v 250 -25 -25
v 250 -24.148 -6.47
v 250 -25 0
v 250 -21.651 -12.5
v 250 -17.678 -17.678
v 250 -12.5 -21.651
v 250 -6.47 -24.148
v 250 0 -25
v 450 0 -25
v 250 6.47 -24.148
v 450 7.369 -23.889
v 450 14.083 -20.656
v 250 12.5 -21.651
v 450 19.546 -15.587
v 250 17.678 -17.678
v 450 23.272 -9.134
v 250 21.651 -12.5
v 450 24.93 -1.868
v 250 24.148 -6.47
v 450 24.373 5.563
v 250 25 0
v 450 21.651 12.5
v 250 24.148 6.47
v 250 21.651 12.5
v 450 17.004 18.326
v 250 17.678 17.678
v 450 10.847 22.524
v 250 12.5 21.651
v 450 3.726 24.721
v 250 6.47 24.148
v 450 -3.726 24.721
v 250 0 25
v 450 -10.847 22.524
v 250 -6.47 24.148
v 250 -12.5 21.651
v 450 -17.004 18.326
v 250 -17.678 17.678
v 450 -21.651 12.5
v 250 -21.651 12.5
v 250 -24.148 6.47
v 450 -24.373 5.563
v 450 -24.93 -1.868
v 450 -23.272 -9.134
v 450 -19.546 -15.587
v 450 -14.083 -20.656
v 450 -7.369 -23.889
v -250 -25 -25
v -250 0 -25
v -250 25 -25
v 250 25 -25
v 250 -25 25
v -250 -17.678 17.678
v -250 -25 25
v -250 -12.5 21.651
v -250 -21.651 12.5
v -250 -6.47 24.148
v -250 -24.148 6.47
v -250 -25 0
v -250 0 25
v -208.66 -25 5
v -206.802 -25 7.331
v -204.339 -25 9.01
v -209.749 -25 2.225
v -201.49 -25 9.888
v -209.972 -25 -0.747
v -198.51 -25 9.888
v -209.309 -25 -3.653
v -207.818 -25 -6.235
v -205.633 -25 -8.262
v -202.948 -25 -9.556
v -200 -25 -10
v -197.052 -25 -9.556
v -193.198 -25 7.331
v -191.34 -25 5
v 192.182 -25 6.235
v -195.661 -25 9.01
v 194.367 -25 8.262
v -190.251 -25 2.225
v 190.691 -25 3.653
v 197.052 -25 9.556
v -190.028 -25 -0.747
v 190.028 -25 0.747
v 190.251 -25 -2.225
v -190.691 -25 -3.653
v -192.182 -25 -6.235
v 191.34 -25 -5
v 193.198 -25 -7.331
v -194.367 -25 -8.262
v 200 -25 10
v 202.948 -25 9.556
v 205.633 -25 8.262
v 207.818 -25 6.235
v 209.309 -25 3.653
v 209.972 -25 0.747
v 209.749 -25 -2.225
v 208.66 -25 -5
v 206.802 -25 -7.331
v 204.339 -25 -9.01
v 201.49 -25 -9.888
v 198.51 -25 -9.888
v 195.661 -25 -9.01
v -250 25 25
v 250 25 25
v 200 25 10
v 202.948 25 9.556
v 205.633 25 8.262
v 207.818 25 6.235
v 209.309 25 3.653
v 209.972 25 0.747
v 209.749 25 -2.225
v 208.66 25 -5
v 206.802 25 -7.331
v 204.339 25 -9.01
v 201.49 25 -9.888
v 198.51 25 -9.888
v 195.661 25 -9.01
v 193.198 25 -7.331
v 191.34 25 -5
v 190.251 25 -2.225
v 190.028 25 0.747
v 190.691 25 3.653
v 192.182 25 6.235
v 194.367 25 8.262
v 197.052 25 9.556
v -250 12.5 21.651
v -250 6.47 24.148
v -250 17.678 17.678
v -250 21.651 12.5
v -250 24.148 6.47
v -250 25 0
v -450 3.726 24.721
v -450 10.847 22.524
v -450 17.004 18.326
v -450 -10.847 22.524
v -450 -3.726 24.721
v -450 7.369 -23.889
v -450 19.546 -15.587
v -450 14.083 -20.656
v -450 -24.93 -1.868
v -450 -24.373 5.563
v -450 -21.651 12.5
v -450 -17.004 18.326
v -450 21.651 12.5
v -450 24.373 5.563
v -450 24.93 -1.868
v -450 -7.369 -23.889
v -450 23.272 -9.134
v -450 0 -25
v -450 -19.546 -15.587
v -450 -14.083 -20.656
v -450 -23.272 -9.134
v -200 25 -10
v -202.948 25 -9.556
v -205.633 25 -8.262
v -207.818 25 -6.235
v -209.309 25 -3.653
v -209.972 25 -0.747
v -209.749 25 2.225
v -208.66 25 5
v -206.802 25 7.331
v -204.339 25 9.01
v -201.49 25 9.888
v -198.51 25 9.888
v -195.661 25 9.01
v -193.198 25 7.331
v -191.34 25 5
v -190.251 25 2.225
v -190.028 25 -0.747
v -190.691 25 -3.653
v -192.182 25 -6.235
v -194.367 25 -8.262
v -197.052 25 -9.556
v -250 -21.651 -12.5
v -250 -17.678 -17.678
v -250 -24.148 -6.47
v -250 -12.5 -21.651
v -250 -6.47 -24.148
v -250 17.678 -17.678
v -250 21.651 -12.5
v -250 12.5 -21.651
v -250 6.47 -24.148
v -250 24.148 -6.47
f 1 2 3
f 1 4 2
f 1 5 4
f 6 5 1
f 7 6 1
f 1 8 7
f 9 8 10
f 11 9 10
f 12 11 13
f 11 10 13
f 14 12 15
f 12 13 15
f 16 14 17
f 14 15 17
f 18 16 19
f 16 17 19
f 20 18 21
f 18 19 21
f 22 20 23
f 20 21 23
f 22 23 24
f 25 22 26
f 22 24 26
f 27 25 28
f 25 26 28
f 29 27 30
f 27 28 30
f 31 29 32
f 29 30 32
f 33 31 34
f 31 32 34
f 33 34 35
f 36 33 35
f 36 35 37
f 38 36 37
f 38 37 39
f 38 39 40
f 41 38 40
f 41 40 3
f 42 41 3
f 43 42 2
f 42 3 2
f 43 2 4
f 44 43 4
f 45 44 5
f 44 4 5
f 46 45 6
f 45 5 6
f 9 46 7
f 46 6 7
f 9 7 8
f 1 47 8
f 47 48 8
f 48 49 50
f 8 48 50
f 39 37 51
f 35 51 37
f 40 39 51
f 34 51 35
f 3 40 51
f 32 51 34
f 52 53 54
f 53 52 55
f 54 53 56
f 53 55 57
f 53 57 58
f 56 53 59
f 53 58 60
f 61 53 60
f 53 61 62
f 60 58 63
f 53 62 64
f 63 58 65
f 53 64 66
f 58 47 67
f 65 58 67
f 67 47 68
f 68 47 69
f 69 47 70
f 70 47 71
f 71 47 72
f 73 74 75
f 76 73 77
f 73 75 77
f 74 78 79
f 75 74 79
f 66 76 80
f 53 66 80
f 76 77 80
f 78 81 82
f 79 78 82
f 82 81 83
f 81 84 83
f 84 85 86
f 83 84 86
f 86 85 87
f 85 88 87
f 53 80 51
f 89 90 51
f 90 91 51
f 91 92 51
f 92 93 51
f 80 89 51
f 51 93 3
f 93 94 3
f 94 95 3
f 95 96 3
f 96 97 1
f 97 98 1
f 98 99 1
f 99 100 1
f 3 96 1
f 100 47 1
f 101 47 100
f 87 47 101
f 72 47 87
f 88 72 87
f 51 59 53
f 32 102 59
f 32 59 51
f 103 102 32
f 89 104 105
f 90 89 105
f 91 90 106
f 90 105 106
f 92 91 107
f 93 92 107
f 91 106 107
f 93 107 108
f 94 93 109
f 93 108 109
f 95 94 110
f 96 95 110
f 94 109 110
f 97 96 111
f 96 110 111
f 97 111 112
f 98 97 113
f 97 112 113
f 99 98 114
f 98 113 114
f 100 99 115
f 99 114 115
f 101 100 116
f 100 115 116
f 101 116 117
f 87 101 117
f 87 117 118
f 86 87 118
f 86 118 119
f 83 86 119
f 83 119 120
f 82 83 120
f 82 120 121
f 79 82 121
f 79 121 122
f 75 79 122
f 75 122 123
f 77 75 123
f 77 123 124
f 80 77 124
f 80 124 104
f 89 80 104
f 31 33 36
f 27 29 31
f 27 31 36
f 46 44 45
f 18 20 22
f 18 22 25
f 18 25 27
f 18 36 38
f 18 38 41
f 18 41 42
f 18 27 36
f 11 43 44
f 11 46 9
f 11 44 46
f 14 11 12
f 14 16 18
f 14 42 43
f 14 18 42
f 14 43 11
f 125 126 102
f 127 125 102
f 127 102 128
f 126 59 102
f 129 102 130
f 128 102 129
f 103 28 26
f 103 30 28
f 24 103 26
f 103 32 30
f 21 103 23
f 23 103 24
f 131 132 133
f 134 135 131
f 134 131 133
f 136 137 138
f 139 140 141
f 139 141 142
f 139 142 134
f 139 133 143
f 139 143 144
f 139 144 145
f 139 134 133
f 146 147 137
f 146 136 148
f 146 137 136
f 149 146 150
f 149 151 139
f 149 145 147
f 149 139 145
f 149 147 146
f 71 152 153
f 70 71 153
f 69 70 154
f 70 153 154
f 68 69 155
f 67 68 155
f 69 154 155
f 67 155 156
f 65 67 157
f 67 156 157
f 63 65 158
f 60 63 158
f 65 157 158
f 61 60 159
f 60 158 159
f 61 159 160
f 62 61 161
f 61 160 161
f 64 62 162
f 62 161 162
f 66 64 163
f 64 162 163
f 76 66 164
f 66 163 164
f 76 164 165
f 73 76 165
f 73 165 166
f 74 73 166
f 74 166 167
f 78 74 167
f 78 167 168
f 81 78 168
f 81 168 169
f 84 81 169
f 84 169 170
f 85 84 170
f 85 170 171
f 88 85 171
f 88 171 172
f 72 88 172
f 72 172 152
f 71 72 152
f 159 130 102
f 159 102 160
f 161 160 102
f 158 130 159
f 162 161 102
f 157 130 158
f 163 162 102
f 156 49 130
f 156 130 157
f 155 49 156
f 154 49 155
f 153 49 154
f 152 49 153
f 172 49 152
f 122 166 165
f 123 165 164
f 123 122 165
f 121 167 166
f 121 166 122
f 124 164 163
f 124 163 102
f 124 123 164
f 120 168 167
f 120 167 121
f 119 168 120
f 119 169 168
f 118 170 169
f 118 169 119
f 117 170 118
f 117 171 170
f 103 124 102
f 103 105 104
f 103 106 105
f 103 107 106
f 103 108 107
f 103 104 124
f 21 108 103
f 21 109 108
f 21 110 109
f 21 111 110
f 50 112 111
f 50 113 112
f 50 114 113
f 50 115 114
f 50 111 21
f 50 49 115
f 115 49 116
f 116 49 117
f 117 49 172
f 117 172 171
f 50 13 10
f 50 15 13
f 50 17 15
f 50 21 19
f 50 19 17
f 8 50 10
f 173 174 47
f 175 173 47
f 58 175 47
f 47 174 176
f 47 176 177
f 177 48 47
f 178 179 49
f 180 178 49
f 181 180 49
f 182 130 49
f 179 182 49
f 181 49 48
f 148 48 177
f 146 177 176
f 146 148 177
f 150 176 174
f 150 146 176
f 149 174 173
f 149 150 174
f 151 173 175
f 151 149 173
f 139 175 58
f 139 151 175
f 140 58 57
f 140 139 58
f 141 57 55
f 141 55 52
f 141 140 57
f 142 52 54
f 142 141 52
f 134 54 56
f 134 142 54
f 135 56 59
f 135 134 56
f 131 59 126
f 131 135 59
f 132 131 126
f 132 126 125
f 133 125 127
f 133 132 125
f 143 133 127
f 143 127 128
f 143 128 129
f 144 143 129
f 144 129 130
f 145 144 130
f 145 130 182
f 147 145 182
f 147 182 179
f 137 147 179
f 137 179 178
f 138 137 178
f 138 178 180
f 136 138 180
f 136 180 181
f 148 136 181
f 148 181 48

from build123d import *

# Parameters (mm, degrees)
SKETCH1_W           = 500
SKETCH1_H           = 50
BOSS_EXTRUDE1_DEPTH = 25
SKETCH2_R           = 10
CUT_EXTRUDE1_DEPTH  = 257.173769149
SKETCH4_R           = 25
BOSS_EXTRUDE2_DEPTH = 200
BOSS_EXTRUDE3_START = 200
SKETCH5_R           = 25
BOSS_EXTRUDE3_DEPTH = 200


with BuildPart() as part:
    # Sketch1 → Boss-Extrude1 (new, symmetric)
    with BuildSketch(Plane(origin=(0, 0, 0), x_dir=(1, 0, 0), z_dir=(0, 1, 0))):
        Rectangle(SKETCH1_W, SKETCH1_H)
    extrude(amount=BOSS_EXTRUDE1_DEPTH, both=True)

    # Sketch2 → Cut-Extrude1 (cut, through all)
    with BuildSketch(Plane(origin=(0, 25, 0), x_dir=(1, 0, 0), z_dir=(0, 1, 0))):
        with Locations(Location((200, 0, 0), (0, 0, 270))):
            Circle(SKETCH2_R)
        with Locations(Location((-200, 0, 0), (0, 0, 90))):
            Circle(SKETCH2_R)
    extrude(amount=-CUT_EXTRUDE1_DEPTH, mode=Mode.SUBTRACT)

    # Sketch4 → Boss-Extrude2 (add)
    with BuildSketch(Plane(origin=(250, 0, 0), x_dir=(0, 0, -1), z_dir=(1, 0, 0))):
        Circle(SKETCH4_R)
    extrude(amount=BOSS_EXTRUDE2_DEPTH)

    # Sketch5 → Boss-Extrude3 (add)
    with BuildSketch(Plane.ZY.offset(250).offset(BOSS_EXTRUDE3_START)):
        with Locations(Location((0, 0, 0), (0, 0, 180))):
            Circle(SKETCH5_R)
    extrude(amount=-BOSS_EXTRUDE3_DEPTH)


solid = part.part
